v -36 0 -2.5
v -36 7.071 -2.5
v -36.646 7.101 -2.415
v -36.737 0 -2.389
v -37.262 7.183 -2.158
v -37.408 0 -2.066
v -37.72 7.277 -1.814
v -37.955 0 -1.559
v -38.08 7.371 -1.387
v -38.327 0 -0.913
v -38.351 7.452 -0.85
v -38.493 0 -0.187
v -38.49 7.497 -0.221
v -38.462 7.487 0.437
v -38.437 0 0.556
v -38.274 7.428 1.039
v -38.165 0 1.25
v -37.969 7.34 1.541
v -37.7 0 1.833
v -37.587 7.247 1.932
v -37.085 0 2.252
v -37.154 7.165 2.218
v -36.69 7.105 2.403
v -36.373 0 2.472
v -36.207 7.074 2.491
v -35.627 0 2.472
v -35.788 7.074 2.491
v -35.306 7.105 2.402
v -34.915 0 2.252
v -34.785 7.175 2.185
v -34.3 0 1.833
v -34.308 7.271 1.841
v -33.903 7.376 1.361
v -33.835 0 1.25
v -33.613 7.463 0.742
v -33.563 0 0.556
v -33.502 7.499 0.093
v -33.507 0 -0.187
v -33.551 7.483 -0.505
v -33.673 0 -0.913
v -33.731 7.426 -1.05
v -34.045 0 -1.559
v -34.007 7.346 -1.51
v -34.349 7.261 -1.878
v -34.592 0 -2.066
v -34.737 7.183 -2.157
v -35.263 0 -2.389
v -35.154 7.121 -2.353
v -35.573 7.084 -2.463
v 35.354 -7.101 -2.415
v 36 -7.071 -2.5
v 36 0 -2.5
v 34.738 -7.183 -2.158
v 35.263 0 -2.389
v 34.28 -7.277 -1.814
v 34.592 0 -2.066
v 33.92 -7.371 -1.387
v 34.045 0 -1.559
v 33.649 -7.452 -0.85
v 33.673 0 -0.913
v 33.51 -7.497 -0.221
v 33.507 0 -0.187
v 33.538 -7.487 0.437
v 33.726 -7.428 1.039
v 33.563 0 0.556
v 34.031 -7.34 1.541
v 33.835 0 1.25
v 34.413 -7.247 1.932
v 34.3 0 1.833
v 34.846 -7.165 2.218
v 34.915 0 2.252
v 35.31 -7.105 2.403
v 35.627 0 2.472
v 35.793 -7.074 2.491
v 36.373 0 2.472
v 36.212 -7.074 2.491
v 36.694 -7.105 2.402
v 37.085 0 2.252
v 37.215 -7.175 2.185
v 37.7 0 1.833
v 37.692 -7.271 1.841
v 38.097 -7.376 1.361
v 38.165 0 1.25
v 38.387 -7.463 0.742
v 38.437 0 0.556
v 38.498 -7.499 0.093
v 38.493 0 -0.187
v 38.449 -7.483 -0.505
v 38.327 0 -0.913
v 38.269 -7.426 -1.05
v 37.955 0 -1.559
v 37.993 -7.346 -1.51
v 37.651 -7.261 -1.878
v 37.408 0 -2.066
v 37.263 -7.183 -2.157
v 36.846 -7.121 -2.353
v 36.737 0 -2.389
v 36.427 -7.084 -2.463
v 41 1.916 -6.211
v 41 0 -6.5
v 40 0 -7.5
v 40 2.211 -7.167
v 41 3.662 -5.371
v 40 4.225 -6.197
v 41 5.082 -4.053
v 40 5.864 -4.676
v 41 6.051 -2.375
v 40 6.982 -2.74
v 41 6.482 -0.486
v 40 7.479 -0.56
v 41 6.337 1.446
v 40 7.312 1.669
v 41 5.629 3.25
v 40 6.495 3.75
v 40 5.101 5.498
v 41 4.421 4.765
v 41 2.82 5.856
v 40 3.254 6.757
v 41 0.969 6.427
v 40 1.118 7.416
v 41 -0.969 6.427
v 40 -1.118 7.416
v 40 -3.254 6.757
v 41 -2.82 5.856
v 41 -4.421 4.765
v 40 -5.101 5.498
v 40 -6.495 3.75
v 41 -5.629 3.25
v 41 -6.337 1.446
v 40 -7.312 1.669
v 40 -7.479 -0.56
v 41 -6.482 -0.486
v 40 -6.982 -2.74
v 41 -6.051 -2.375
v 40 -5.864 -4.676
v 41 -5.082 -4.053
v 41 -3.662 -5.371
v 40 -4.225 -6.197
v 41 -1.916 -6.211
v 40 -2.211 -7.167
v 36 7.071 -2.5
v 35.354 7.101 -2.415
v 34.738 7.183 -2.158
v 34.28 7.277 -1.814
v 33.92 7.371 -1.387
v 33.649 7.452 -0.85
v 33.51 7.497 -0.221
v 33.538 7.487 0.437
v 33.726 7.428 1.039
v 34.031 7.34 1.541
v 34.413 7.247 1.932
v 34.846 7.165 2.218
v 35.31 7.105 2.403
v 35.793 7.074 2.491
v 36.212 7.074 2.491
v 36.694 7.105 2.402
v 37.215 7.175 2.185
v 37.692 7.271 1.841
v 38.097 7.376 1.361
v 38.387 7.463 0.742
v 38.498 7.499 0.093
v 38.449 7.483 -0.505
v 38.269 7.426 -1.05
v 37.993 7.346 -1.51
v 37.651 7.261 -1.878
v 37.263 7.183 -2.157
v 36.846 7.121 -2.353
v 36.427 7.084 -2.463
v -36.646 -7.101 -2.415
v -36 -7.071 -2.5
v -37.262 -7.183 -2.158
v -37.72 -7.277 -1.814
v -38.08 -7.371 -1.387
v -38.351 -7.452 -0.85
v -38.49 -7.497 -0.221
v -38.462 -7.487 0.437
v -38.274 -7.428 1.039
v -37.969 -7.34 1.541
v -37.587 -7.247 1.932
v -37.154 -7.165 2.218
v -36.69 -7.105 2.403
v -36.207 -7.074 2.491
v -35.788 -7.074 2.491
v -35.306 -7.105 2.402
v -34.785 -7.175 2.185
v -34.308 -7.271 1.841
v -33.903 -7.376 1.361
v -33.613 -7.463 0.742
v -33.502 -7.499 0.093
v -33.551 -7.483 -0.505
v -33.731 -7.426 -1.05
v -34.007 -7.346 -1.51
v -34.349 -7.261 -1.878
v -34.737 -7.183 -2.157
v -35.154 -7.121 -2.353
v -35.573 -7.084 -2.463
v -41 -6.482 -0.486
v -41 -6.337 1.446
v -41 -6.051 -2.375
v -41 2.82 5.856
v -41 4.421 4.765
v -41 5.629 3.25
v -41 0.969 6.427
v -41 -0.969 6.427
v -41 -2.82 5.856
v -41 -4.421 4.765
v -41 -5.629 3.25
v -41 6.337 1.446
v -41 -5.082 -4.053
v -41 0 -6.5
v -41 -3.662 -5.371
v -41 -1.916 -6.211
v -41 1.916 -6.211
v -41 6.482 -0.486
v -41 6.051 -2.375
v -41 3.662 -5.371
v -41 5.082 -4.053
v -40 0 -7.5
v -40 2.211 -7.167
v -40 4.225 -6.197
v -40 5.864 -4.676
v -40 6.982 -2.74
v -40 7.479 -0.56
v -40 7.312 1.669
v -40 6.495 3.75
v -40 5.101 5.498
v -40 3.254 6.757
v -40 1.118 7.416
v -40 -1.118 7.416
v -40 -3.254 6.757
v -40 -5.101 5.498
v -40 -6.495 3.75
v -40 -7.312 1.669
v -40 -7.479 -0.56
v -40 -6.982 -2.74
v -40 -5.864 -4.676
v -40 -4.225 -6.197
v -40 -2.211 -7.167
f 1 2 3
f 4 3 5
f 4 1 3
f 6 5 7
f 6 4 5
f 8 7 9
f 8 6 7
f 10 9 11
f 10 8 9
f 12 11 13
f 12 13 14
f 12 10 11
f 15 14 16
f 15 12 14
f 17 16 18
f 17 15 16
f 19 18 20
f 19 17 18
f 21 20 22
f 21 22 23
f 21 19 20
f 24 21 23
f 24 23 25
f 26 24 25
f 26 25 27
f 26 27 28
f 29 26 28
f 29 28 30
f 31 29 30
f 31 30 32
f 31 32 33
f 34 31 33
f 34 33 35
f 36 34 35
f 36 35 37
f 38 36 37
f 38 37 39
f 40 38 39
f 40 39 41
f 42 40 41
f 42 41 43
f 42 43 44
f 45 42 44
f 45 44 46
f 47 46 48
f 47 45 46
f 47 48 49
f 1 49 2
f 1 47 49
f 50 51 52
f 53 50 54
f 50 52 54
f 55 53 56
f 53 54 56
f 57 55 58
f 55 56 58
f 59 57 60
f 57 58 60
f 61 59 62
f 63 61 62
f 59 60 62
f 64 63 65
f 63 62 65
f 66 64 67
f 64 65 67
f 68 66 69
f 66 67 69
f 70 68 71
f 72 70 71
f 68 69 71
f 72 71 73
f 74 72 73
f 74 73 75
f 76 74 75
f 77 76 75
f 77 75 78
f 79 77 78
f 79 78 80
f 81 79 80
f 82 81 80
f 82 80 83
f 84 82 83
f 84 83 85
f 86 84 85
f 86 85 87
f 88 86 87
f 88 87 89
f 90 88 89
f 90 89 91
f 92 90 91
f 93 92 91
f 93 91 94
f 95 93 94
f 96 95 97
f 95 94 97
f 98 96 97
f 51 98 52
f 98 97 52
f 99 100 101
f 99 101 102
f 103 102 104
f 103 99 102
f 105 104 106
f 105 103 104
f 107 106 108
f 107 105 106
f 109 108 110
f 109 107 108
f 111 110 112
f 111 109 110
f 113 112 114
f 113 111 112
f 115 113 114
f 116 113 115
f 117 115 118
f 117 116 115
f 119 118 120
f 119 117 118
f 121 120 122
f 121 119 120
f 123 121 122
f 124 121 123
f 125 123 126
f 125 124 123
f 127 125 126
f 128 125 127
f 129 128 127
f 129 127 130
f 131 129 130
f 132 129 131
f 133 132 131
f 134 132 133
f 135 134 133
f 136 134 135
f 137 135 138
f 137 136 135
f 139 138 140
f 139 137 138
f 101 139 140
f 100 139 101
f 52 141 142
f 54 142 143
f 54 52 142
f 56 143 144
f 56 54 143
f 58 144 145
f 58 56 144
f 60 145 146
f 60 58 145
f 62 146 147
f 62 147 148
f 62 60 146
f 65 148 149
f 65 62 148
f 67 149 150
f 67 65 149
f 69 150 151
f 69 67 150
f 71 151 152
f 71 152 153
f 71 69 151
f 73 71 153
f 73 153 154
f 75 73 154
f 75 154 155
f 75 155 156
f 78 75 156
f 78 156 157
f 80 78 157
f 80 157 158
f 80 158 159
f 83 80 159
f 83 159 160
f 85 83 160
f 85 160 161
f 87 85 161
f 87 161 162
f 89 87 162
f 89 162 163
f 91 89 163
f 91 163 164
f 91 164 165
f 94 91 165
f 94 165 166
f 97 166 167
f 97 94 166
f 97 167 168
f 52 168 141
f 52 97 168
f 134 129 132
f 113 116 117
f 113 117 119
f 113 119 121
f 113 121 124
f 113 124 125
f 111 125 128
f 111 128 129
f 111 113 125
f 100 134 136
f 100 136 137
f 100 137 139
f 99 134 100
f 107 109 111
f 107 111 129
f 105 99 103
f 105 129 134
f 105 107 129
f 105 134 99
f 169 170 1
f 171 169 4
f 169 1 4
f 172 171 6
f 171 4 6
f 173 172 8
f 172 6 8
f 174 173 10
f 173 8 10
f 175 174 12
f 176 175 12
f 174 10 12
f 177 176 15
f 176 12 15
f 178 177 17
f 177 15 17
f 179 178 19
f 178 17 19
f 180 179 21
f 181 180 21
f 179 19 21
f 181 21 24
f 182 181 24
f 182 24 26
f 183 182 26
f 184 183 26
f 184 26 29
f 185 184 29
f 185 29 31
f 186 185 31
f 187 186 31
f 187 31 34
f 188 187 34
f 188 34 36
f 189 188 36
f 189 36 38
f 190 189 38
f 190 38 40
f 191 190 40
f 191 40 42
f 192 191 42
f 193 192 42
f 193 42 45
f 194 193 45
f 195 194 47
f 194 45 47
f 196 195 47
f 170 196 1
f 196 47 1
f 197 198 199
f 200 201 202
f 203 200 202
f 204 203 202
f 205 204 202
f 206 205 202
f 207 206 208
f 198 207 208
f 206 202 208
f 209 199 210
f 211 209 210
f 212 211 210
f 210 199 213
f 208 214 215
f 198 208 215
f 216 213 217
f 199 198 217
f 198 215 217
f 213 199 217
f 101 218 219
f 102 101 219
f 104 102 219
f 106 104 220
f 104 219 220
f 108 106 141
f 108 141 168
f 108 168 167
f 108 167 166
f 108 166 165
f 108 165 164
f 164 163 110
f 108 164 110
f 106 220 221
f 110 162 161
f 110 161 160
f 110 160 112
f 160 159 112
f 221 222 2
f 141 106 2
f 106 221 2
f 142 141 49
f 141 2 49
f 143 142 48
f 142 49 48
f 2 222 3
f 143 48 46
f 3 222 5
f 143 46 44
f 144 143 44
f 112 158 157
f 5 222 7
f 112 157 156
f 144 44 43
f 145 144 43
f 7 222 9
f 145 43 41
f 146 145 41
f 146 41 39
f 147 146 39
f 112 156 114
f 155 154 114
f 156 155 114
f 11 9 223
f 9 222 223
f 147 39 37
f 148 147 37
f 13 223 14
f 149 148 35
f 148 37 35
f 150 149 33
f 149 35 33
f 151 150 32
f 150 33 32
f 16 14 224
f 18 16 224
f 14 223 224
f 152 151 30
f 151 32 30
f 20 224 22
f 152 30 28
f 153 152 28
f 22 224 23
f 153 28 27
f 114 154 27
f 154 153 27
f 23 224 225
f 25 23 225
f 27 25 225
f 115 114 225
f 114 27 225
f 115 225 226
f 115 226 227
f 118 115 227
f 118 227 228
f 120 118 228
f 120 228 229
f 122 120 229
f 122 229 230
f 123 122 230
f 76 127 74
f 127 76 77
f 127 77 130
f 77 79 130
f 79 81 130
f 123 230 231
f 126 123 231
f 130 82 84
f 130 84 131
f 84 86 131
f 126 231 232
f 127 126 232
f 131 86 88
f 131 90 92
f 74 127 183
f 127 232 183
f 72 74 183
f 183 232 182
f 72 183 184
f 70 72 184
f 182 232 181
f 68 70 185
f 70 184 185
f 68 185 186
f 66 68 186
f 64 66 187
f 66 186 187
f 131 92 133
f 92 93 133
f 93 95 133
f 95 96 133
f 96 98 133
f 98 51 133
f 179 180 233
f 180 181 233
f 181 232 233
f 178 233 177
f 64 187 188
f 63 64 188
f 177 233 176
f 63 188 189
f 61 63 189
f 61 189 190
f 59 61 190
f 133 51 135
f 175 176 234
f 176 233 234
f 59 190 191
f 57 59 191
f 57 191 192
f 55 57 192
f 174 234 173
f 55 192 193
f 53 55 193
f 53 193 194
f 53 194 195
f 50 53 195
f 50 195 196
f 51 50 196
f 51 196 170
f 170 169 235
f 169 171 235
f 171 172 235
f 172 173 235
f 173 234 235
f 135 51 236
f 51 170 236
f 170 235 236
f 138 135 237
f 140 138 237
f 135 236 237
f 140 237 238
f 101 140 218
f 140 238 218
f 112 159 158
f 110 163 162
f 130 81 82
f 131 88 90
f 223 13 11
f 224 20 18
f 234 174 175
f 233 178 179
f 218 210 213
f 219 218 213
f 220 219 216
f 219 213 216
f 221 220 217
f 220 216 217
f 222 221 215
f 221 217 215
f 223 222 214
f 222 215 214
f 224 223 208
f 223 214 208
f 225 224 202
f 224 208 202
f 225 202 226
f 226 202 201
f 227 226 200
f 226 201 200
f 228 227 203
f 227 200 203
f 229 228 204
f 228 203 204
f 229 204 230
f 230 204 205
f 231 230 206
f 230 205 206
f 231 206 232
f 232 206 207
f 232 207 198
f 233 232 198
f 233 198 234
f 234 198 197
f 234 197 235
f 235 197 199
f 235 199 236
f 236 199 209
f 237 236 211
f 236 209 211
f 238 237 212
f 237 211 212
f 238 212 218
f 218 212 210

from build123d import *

# Parameters (mm, degrees)
DODANIE_WYCI_GNI_CIE1_DEPTH                 = 41
DODANIE_WYCI_GNI_CIE1_DEPTH_BACK            = 41
SZKIC2_R                                    = 7.5
WYTNIJ_WYCI_GNI_CIE1_REACH                  = 44.35
WYTNIJ_WYCI_GNI_CIE1_END_RADIUS             = 7.5
SZKIC3_R                                    = 2.5
WYTNIJ_WYCI_GNI_CIE1_DIRECTION_2_REACH      = 44.35
WYTNIJ_WYCI_GNI_CIE1_DIRECTION_2_END_RADIUS = 7.5
SFAZOWANIE1_SIZE                            = 1


with BuildPart() as part:
    # Szkic2 → Dodanie-wyciągnięcie1 (new, two sides: drawn at the far end of the back side and taken through both)
    with BuildSketch(Plane(origin=(0, 0, 0), x_dir=(0, 0, -1), z_dir=(1, 0, 0)).offset(-DODANIE_WYCI_GNI_CIE1_DEPTH_BACK)):
        Circle(SZKIC2_R)
    extrude(amount=DODANIE_WYCI_GNI_CIE1_DEPTH + DODANIE_WYCI_GNI_CIE1_DEPTH_BACK)

    # Wytnij-wyciągnięcie1: up to this cylinder (the profile starts inside it)
    wytnij_wyci_gni_cie1_end = Plane(origin=(0, 0, 0), z_dir=(1, 0, 0)) * Cylinder(WYTNIJ_WYCI_GNI_CIE1_END_RADIUS, 176.7, mode=Mode.PRIVATE)
    # Szkic3 → Wytnij-wyciągnięcie1 (cut, up to the surface)
    with BuildSketch(Plane(origin=(0, 0, 0), x_dir=(1, 0, 0), z_dir=(0, 1, 0)), mode=Mode.PRIVATE) as wytnij_wyci_gni_cie1_sk1:
        with Locations(Location((-36, 0, 0), (0, 0, 90))):
            Circle(SZKIC3_R)
    wytnij_wyci_gni_cie1_tool1 = extrude(wytnij_wyci_gni_cie1_sk1.sketch, amount=-WYTNIJ_WYCI_GNI_CIE1_REACH, mode=Mode.PRIVATE) & wytnij_wyci_gni_cie1_end
    add(wytnij_wyci_gni_cie1_tool1.solids().sort_by_distance((-36, 0, 0))[0], mode=Mode.SUBTRACT)
    # Szkic3 → Wytnij-wyciągnięcie1 (cut, up to the surface)
    with BuildSketch(Plane(origin=(0, 0, 0), x_dir=(1, 0, 0), z_dir=(0, 1, 0)), mode=Mode.PRIVATE) as wytnij_wyci_gni_cie1_sk2:
        with Locations(Location((36, 0, 0), (0, 0, 90))):
            Circle(SZKIC3_R)
    wytnij_wyci_gni_cie1_tool2 = extrude(wytnij_wyci_gni_cie1_sk2.sketch, amount=-WYTNIJ_WYCI_GNI_CIE1_REACH, mode=Mode.PRIVATE) & wytnij_wyci_gni_cie1_end
    add(wytnij_wyci_gni_cie1_tool2.solids().sort_by_distance((36, 0, 0))[0], mode=Mode.SUBTRACT)

    # Wytnij-wyciągnięcie1 direction 2: up to this cylinder (the profile starts inside it)
    wytnij_wyci_gni_cie1_direction_2_end = Plane(origin=(0, 0, 0), z_dir=(1, 0, 0)) * Cylinder(WYTNIJ_WYCI_GNI_CIE1_DIRECTION_2_END_RADIUS, 176.7, mode=Mode.PRIVATE)
    # Szkic3 → Wytnij-wyciągnięcie1 direction 2 (cut, up to the surface)
    with BuildSketch(Plane(origin=(0, 0, 0), x_dir=(1, 0, 0), z_dir=(0, 1, 0)), mode=Mode.PRIVATE) as wytnij_wyci_gni_cie1_direction_2_sk1:
        with Locations(Location((-36, 0, 0), (0, 0, 90))):
            Circle(SZKIC3_R)
    wytnij_wyci_gni_cie1_direction_2_tool1 = extrude(wytnij_wyci_gni_cie1_direction_2_sk1.sketch, amount=WYTNIJ_WYCI_GNI_CIE1_DIRECTION_2_REACH, mode=Mode.PRIVATE) & wytnij_wyci_gni_cie1_direction_2_end
    add(wytnij_wyci_gni_cie1_direction_2_tool1.solids().sort_by_distance((-36, 0, 0))[0], mode=Mode.SUBTRACT)
    # Szkic3 → Wytnij-wyciągnięcie1 direction 2 (cut, up to the surface)
    with BuildSketch(Plane(origin=(0, 0, 0), x_dir=(1, 0, 0), z_dir=(0, 1, 0)), mode=Mode.PRIVATE) as wytnij_wyci_gni_cie1_direction_2_sk2:
        with Locations(Location((36, 0, 0), (0, 0, 90))):
            Circle(SZKIC3_R)
    wytnij_wyci_gni_cie1_direction_2_tool2 = extrude(wytnij_wyci_gni_cie1_direction_2_sk2.sketch, amount=WYTNIJ_WYCI_GNI_CIE1_DIRECTION_2_REACH, mode=Mode.PRIVATE) & wytnij_wyci_gni_cie1_direction_2_end
    add(wytnij_wyci_gni_cie1_direction_2_tool2.solids().sort_by_distance((36, 0, 0))[0], mode=Mode.SUBTRACT)

    # Sfazowanie1
    sfazowanie1_edges = [part.edges().sort_by_distance(p)[0] for p in [
        (-41, 0, 7.5),
        (41, 0, 7.5),
    ]]
    chamfer(sfazowanie1_edges, length=SFAZOWANIE1_SIZE)


solid = part.part
